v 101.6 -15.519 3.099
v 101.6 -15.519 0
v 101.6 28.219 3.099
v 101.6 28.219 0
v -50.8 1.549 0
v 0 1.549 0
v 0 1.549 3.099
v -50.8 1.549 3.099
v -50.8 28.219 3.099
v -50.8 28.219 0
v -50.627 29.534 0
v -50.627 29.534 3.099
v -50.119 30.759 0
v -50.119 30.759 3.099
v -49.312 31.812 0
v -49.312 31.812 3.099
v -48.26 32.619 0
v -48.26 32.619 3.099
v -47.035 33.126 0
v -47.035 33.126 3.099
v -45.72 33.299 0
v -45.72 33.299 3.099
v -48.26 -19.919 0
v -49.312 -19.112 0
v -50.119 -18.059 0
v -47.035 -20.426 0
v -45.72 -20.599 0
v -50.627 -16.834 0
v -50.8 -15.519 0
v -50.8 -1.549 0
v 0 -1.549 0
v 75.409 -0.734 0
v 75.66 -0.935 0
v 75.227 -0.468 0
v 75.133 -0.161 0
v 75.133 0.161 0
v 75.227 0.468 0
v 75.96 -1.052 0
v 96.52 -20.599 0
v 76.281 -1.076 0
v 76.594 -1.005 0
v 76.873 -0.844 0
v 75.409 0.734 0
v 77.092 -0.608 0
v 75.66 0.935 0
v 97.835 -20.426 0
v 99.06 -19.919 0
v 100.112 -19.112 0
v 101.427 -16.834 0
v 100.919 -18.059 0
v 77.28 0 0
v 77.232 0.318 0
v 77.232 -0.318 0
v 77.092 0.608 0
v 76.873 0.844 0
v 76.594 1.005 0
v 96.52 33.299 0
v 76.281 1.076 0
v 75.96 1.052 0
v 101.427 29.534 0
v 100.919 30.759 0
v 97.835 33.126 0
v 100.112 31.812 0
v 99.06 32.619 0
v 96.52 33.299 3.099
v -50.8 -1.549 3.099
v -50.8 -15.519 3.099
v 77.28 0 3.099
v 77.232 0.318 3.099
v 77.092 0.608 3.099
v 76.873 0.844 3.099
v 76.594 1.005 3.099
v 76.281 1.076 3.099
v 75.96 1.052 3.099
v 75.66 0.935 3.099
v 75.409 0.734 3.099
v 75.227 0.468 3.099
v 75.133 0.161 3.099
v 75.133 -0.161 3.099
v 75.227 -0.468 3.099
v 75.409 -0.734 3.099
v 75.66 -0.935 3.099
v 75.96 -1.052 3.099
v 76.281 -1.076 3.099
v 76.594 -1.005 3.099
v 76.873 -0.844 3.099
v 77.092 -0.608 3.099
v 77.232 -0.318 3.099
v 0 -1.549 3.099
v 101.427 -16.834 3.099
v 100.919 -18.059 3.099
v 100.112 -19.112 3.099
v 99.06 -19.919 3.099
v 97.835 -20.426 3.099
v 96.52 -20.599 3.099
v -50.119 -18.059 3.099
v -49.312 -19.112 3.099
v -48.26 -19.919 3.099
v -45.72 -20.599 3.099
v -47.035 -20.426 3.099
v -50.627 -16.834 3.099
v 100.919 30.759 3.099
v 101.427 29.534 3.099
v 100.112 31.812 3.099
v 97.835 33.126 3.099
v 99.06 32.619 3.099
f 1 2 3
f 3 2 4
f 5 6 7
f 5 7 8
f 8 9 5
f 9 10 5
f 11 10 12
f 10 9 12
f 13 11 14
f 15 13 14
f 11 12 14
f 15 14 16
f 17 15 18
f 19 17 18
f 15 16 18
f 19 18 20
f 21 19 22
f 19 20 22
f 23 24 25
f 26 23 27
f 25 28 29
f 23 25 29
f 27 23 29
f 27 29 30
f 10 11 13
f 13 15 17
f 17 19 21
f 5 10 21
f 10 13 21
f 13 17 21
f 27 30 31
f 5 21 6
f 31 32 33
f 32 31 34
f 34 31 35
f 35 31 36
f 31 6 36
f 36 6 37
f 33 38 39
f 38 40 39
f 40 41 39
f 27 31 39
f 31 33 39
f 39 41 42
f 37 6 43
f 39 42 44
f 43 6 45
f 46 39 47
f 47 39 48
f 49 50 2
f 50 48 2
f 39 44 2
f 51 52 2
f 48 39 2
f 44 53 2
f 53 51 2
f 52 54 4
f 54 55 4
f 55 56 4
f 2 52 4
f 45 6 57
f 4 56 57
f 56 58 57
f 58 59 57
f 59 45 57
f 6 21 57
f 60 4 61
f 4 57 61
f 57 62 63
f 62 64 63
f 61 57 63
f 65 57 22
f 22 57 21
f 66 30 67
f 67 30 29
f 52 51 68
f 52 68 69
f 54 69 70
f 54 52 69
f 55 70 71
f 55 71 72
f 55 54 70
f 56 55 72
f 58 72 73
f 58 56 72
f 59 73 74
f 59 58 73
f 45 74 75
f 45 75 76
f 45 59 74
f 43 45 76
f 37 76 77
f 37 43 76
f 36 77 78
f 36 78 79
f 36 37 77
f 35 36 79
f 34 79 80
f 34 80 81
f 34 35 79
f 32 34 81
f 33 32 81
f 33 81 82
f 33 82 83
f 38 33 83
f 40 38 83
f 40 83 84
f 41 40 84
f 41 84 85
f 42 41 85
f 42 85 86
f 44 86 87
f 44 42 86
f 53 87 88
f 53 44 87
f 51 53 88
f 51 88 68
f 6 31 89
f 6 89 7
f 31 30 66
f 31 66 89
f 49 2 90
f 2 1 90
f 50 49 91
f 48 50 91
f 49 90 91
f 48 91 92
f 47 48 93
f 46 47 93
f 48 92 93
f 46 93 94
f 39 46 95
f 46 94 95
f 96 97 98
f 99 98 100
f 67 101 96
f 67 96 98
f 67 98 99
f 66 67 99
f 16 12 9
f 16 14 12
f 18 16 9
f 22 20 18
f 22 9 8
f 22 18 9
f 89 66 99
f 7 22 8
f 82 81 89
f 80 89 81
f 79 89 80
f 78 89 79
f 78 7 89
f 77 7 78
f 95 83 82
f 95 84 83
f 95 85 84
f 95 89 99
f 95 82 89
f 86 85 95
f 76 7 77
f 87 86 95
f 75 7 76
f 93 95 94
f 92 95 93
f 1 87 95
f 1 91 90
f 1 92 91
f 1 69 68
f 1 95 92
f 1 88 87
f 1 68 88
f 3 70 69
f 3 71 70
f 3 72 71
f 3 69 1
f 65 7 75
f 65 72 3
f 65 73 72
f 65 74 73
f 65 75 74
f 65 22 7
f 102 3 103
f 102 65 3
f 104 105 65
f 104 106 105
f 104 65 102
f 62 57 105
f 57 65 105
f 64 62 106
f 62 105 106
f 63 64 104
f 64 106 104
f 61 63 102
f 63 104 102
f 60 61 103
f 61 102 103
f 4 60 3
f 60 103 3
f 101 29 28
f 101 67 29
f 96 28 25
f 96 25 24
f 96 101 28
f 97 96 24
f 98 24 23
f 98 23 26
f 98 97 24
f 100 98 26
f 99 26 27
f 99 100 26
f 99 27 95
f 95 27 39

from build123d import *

# Parameters (mm, degrees)
BOSS_EXTRUDE1_DEPTH = 3.0988
SKETCH3_R           = 1.0795
BOSS_EXTRUDE2_DEPTH = 3.0988
FILLET1_R           = 5.08


with BuildPart() as part:
    # Sketch2 → Boss-Extrude1 (new body)
    with BuildSketch(Plane.XY):
        Polygon((-50.8, 1.5494), (-50.8, 7.8994), (50.8, 7.8994), (50.8, -7.8994), (-50.8, -7.8994), (-50.8, -1.5494), (0, -1.5494), (0, 1.5494), align=None)
    extrude(amount=BOSS_EXTRUDE1_DEPTH)

    # Sketch3 → Boss-Extrude2 (add)
    with BuildSketch(Plane.XY):
        Polygon((50.8, -7.8994), (-50.8, -7.8994), (-50.8, -20.5994), (101.6, -20.5994), (101.6, 33.2994), (-50.8, 33.2994), (-50.8, 7.8994), (50.8, 7.8994), align=None)
        with Locations((76.2, 0)):
            Circle(SKETCH3_R, mode=Mode.SUBTRACT)
    extrude(amount=BOSS_EXTRUDE2_DEPTH)

    # Fillet1
    fillet1_edges = [part.edges().sort_by_distance(p)[0] for p in [
        (101.6, -20.5994, 1.5494),
        (101.6, 33.2994, 1.5494),
        (-50.8, 33.2994, 1.5494),
        (-50.8, -20.5994, 1.5494),
    ]]
    fillet(fillet1_edges, radius=FILLET1_R)


solid = part.part
